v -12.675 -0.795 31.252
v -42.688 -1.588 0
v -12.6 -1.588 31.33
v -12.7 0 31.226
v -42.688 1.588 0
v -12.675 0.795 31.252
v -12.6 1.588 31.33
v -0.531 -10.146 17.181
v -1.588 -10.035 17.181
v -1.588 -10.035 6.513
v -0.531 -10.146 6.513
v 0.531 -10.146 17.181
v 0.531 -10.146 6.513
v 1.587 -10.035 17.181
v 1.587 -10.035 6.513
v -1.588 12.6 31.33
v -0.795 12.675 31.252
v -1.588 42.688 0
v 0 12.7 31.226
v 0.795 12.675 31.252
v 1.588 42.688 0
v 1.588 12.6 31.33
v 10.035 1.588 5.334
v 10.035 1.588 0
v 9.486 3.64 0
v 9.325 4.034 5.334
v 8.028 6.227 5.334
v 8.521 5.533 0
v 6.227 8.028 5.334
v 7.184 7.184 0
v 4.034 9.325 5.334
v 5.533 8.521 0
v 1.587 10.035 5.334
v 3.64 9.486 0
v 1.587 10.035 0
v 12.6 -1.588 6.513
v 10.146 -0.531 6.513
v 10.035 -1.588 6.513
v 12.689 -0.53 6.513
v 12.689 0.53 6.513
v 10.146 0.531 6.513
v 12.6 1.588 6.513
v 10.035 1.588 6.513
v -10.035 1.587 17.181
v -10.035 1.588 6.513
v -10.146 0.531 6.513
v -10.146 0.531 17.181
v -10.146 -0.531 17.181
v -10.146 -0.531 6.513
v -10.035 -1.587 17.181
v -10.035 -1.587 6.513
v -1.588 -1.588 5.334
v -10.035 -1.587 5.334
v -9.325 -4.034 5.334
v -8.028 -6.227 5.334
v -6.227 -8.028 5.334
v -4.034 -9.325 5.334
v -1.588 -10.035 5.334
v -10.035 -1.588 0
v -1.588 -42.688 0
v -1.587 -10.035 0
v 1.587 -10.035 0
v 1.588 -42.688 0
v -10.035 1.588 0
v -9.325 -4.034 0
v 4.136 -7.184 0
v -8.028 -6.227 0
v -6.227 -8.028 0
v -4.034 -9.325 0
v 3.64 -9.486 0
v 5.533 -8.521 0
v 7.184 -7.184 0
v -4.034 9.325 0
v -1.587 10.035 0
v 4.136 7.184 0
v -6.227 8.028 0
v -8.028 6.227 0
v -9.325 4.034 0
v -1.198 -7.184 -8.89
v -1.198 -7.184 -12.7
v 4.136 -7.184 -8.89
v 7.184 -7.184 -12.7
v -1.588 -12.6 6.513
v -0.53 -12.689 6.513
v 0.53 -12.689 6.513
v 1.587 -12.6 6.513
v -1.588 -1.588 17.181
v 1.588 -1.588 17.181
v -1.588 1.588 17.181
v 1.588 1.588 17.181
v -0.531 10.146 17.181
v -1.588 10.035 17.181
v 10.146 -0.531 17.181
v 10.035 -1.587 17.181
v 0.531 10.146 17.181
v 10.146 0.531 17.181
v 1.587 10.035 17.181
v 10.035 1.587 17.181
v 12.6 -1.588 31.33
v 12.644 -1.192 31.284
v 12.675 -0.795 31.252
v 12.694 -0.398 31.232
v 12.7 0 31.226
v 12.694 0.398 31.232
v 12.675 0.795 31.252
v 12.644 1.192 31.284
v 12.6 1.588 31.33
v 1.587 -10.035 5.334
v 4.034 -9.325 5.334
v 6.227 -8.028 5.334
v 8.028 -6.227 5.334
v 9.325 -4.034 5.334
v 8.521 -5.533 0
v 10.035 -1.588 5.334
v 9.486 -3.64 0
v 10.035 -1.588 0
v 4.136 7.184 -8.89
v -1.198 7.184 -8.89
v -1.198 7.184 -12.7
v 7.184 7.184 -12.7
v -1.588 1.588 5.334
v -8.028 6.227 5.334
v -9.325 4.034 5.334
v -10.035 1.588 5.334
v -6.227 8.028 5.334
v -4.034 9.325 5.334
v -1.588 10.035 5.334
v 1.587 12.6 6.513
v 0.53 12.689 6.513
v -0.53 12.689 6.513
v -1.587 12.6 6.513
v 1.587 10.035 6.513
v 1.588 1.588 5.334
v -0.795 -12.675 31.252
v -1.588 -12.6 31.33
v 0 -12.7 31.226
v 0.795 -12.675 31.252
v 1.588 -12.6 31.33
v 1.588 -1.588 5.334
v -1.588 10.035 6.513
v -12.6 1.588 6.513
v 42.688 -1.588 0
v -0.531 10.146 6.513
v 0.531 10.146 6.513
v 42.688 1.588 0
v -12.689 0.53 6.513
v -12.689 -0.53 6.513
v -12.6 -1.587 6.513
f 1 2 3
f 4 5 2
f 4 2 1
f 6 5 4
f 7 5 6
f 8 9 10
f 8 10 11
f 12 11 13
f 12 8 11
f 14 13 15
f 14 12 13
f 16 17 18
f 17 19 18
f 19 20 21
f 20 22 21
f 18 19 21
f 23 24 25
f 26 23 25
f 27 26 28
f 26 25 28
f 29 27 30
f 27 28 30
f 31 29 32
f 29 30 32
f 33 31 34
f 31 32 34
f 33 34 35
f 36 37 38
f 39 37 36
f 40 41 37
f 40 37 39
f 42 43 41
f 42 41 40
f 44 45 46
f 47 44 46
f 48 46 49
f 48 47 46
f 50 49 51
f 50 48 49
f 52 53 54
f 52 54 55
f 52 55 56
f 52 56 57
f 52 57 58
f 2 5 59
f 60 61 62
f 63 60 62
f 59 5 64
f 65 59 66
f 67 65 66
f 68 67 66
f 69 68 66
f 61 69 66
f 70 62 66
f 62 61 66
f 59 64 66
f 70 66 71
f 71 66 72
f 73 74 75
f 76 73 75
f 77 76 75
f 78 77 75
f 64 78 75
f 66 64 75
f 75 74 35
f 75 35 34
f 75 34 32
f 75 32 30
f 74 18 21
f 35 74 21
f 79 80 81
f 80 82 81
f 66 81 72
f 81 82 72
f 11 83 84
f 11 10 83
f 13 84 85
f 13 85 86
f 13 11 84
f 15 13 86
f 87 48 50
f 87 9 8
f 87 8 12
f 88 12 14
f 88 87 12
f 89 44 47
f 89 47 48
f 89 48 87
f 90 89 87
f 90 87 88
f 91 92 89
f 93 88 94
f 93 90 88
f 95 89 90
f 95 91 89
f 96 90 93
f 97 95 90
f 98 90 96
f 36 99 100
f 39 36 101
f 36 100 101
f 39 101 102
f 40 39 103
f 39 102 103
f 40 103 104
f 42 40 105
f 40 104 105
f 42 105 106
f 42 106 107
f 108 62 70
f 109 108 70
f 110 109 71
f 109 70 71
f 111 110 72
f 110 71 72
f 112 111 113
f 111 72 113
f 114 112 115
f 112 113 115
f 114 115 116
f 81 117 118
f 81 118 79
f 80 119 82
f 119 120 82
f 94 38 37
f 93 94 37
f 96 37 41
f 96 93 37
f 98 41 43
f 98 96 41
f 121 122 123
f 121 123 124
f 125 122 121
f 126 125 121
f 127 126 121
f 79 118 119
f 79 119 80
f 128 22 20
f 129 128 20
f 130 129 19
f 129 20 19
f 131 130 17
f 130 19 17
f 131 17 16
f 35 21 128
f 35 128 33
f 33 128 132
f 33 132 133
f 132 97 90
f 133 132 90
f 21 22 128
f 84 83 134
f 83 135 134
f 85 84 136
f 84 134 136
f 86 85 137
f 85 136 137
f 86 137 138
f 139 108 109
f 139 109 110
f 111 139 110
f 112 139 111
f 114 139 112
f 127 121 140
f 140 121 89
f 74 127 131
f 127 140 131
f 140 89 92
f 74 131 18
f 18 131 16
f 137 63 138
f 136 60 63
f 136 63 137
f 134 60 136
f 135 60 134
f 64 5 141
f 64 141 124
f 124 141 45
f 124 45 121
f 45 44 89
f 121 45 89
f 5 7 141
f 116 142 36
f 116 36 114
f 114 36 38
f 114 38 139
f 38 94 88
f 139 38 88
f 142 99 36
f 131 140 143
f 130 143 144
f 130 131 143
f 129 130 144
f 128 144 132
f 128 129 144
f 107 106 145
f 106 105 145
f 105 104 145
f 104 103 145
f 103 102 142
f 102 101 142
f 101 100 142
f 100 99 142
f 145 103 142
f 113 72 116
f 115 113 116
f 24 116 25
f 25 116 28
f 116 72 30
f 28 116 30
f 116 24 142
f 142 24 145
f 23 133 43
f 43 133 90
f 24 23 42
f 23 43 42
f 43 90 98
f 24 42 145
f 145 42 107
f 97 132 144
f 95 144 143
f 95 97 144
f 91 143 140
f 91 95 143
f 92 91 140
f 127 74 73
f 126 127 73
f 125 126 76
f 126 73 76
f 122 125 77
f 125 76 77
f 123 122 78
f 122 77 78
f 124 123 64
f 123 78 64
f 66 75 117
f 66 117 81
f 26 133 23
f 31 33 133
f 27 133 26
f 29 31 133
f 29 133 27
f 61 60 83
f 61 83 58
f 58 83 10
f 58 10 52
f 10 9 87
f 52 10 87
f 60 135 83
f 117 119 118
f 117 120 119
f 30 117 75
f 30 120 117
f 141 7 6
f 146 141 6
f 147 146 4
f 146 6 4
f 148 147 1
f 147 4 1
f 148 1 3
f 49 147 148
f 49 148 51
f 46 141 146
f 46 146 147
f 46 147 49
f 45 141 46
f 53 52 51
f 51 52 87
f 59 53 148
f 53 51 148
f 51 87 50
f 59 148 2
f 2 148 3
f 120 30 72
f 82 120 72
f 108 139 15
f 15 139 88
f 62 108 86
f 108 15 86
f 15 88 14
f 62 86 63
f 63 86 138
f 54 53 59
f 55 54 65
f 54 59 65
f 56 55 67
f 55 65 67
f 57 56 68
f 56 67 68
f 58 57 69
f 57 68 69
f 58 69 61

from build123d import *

# Parameters (mm, degrees)
F0_W          = 101.6
F0_H          = 101.6
F1_DEPTH      = 50.8
F3_DEPTH      = 50.801
F5_DEPTH      = 42.6892808993
F5_DEPTH_BACK = 42.6892808993
F7_DEPTH      = 42.6892808993
F7_DEPTH_BACK = 42.6892808993
F9_DEPTH      = 25.4
F9_DEPTH_BACK = 25.4
F10_R         = 12.7
F10_R_2       = 10.16
F11_DEPTH     = 36.068
F12_R         = 10.16
F13_DEPTH     = 25.4
F14_R         = 10.16
F15_DEPTH     = 5.334
F16_W         = 3.048
F16_H         = 14.3684097937
F17_DEPTH     = 12.7
F18_W         = 14.3684097937
F18_H         = 3.81
F19_DEPTH     = 5.334


with BuildPart() as f1:
    # F0 (on Top) → F1 (new body)
    with BuildSketch(Plane.XY):
        Rectangle(F0_W, F0_H)
    extrude(amount=F1_DEPTH)

    # F2 (on face) → F3 (cut, through all)
    with BuildSketch(Plane.XY.offset(50.8)):
        Polygon((-1.5875, 50.8), (-50.8, 50.8), (-50.8, 1.5875), (-50.8, -1.5875), (-50.8, -50.8), (-1.5875, -50.8), (1.5875, -50.8), (50.8, -50.8), (50.8, -1.5875), (50.8, 1.5875), (50.8, 50.8), (1.5875, 50.8), align=None)
        Polygon((-42.6882808993, -1.5875), (-42.6882808993, 1.5875), (-1.5875, 1.5875), (-1.5875, 42.6882808993), (1.5875, 42.6882808993), (1.5875, 1.5875), (42.6882808993, 1.5875), (42.6882808993, -1.5875), (1.5875, -1.5875), (1.5875, -42.6882808993), (-1.5875, -42.6882808993), (-1.5875, -1.5875), align=None, mode=Mode.SUBTRACT)
    extrude(amount=-F3_DEPTH, mode=Mode.SUBTRACT)

    # F4 (on Front) → F5 (cut, two sides)
    with BuildSketch(Plane.XZ) as f5_sk:
        Polygon((0, 44.45), (42.6882808993, 0), (42.6882808993, 50.8), (-42.6882808993, 50.8), (-42.6882808993, 0), align=None)
    extrude(amount=-F5_DEPTH, mode=Mode.SUBTRACT)
    extrude(f5_sk.sketch, amount=F5_DEPTH_BACK, mode=Mode.SUBTRACT)

    # F6 (on Right) → F7 (cut, two sides)
    with BuildSketch(Plane.YZ) as f7_sk:
        Polygon((-42.6882808993, 50.8), (-42.6882808993, 0), (0, 44.45), (42.6882808993, 0), (42.6882808993, 50.8), align=None)
    extrude(amount=-F7_DEPTH, mode=Mode.SUBTRACT)
    extrude(f7_sk.sketch, amount=F7_DEPTH_BACK, mode=Mode.SUBTRACT)

    # F8 (on Front) → F9 (cut, two sides)
    with BuildSketch(Plane.XZ) as f9_sk:
        Polygon((0, 64.3248185515), (-9.6034230664, 42.5812155008), (15.0393228978, 42.5812155008), align=None)
    extrude(amount=-F9_DEPTH, mode=Mode.SUBTRACT)
    extrude(f9_sk.sketch, amount=F9_DEPTH_BACK, mode=Mode.SUBTRACT)

    # F10 (on face) → F11 (cut)
    with BuildSketch(Plane.XY.offset(42.5812155008)):
        Circle(F10_R)
        Circle(F10_R_2, mode=Mode.SUBTRACT)
    extrude(amount=-F11_DEPTH, mode=Mode.SUBTRACT)

    # F12 (on face) → F13 (cut)
    with BuildSketch(Plane.XY.offset(42.5812155008)):
        Circle(F12_R)
    extrude(amount=-F13_DEPTH, mode=Mode.SUBTRACT)

    # F14 (on Top) → F15 (join)
    with BuildSketch(Plane.XY):
        Circle(F14_R)
    extrude(amount=F15_DEPTH)

    # F16 (on face) → F17 (join)
    with BuildSketch(Plane(origin=(0, 0, 0), x_dir=(1, 0, 0), z_dir=(0, 0, -1))):
        with Locations((5.6602048969, 0)):
            Rectangle(F16_W, F16_H)
    extrude(amount=F17_DEPTH)

    # F18 (on face) → F19 (join)
    with BuildSketch(Plane(origin=(4.1362048969, 0, 0), x_dir=(0, -1, 0), z_dir=(-1, 0, 0))):
        with Locations((0, -10.795)):
            Rectangle(F18_W, F18_H)
    extrude(amount=F19_DEPTH)


solid = f1.part
